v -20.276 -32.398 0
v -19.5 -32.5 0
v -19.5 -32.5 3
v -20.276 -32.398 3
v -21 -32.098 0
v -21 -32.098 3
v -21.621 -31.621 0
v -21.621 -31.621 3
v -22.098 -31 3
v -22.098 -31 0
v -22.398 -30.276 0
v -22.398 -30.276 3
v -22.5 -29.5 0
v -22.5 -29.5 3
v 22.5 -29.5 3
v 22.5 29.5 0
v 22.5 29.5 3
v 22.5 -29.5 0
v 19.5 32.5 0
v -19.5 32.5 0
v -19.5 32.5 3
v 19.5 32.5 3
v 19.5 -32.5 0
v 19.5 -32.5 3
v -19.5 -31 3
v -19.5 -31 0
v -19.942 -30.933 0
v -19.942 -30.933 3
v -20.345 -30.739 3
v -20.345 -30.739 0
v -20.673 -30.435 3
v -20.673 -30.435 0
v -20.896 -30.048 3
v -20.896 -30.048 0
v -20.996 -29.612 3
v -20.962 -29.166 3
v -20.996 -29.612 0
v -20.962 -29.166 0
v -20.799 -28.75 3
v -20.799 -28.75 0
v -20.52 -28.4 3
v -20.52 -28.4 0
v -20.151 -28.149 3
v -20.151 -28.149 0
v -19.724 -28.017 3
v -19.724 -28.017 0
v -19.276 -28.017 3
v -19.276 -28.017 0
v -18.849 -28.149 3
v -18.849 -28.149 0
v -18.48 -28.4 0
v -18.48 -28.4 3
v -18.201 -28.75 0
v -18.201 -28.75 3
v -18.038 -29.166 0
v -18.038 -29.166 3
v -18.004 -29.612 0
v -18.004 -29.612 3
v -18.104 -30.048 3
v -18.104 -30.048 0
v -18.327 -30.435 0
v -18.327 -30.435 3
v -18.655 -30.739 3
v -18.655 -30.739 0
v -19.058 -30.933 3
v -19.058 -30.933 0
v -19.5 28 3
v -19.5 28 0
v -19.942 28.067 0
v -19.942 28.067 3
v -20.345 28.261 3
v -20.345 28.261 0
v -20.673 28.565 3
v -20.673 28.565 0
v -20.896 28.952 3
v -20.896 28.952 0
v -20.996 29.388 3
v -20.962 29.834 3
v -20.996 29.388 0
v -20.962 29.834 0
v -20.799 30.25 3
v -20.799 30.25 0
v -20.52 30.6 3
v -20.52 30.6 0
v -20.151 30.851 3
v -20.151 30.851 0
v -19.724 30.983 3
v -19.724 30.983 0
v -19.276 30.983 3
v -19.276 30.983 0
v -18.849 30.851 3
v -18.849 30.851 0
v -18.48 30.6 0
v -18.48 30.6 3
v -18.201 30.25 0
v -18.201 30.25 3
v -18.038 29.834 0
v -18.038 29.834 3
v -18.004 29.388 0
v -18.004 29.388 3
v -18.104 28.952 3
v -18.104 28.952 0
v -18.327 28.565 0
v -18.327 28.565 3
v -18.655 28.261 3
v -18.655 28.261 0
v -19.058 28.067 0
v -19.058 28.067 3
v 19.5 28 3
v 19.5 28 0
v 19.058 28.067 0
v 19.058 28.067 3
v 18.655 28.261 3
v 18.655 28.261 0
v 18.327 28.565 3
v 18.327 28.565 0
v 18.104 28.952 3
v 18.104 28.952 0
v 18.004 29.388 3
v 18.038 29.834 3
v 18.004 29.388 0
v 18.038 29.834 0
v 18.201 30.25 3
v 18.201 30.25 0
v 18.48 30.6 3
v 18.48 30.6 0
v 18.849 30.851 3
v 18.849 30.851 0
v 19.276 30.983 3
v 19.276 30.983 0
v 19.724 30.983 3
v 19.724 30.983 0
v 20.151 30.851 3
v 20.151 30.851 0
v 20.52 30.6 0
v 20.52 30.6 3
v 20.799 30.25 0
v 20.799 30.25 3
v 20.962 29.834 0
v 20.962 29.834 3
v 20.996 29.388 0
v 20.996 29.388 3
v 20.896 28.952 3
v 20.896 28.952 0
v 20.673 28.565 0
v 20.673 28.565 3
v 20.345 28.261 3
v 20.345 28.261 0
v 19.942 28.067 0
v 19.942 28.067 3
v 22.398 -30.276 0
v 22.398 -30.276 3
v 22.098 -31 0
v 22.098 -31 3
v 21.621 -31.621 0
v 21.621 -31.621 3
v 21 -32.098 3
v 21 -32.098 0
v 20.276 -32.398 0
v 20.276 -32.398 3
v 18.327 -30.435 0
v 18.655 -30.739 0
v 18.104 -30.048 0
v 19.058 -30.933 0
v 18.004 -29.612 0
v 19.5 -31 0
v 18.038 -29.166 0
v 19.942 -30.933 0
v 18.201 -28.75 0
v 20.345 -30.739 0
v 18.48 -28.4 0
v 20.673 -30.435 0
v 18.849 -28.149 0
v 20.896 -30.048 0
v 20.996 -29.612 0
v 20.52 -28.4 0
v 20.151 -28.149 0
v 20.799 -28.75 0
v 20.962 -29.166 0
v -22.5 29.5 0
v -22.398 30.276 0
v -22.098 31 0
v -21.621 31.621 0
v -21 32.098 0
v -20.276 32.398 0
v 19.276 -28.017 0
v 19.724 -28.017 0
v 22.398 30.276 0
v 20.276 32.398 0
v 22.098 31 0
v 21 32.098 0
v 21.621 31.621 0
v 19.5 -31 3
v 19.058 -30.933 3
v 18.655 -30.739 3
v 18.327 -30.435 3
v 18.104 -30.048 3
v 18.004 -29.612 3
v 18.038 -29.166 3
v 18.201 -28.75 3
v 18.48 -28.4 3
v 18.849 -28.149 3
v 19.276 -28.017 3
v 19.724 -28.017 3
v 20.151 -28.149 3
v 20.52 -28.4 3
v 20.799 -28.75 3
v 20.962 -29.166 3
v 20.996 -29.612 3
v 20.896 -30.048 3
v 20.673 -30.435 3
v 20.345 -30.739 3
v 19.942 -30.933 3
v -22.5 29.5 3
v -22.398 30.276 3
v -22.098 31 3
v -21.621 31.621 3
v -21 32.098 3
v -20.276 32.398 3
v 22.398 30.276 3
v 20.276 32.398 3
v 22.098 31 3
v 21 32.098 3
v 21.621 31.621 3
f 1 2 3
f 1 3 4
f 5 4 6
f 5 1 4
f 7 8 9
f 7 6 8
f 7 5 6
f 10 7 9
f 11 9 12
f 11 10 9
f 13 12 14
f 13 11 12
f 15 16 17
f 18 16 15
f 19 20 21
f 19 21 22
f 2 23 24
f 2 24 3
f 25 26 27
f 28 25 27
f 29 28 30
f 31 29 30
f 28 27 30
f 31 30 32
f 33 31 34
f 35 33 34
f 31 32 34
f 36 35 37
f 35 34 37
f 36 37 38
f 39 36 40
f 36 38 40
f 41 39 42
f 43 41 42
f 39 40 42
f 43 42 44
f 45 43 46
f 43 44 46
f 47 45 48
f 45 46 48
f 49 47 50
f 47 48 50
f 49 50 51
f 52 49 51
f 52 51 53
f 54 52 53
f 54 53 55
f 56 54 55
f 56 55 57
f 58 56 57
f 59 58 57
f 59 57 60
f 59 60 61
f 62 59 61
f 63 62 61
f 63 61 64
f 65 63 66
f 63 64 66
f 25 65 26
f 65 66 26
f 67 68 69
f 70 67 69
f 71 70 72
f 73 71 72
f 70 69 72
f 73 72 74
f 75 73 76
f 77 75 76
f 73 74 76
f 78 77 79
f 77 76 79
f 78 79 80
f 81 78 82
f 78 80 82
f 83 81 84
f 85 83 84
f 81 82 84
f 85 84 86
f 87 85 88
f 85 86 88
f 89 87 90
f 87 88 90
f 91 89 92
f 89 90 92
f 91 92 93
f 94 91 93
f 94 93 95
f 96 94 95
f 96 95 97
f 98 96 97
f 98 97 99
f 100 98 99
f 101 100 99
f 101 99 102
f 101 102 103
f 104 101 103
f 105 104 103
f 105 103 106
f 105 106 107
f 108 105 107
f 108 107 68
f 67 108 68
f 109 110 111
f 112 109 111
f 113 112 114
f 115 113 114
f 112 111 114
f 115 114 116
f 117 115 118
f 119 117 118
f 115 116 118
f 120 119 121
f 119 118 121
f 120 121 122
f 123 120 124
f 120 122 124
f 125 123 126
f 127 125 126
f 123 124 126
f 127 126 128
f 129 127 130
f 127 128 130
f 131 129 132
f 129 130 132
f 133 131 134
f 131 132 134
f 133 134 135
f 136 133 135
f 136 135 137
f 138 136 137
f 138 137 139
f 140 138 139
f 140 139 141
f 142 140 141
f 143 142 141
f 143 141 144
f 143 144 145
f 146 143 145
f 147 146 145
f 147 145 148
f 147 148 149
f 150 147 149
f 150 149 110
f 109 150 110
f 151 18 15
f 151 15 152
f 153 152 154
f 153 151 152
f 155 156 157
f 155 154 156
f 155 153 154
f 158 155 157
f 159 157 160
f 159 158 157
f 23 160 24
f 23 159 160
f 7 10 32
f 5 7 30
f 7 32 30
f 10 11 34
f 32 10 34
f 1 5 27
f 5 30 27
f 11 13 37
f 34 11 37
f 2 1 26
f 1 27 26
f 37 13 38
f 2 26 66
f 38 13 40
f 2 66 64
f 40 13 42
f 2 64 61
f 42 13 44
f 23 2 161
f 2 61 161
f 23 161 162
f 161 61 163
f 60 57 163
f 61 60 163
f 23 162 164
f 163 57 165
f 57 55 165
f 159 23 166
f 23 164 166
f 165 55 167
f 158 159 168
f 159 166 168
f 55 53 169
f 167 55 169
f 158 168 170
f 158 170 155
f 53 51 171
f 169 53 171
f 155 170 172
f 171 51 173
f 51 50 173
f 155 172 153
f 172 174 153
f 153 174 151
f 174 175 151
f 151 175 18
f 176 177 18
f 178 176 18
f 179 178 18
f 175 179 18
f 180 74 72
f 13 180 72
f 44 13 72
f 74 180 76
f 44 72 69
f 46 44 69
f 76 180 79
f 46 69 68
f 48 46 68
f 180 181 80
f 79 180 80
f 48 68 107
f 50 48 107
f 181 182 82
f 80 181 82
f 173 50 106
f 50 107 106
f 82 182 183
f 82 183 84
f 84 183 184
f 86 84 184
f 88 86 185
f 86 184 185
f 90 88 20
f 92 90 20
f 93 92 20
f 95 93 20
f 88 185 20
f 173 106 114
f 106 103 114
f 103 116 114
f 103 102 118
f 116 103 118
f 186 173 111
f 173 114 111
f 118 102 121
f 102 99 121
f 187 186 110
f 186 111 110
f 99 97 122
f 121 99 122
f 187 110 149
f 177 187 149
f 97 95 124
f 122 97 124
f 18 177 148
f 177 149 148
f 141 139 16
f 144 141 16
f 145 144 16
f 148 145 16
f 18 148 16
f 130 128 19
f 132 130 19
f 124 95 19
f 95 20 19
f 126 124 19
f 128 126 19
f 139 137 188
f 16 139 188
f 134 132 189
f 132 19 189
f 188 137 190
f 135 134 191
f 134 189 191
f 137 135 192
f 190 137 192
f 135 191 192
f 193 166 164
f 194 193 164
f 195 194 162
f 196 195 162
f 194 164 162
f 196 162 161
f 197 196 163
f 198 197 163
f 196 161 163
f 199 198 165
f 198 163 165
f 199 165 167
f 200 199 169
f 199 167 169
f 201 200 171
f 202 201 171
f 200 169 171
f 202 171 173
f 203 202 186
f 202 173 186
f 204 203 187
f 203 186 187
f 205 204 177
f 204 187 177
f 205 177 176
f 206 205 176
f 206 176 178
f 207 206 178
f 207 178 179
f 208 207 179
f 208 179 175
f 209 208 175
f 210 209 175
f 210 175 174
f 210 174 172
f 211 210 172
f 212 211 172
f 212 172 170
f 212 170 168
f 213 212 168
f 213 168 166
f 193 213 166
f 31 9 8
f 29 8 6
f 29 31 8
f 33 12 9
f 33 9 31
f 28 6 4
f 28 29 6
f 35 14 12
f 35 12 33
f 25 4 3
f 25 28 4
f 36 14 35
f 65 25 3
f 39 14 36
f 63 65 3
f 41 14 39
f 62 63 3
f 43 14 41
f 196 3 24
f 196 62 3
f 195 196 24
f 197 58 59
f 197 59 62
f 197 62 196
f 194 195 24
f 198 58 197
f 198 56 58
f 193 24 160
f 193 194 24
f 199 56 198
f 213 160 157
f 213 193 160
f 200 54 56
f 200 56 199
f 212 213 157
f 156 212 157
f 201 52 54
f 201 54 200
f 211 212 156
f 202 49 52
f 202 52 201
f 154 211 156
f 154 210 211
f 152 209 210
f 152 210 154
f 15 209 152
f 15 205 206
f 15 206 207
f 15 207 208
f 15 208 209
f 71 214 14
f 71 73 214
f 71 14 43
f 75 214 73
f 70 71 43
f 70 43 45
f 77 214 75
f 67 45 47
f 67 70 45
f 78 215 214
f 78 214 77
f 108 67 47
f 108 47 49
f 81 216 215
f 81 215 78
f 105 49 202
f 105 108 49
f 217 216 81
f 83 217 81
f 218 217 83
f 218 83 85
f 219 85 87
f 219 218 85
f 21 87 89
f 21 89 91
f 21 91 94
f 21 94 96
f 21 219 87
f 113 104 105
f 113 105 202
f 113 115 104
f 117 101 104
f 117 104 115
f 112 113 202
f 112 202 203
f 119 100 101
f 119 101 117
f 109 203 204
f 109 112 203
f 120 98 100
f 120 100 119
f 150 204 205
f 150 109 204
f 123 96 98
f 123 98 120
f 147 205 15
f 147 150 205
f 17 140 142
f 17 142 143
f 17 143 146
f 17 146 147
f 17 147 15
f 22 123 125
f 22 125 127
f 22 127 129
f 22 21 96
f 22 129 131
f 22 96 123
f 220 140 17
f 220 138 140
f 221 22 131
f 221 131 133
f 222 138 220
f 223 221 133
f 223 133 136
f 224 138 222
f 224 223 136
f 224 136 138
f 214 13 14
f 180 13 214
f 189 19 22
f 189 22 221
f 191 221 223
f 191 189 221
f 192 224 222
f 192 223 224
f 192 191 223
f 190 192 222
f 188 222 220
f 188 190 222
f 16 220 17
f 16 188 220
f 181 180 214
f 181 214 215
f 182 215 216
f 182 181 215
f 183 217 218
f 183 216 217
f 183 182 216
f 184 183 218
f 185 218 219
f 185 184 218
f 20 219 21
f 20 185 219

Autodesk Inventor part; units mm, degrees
ref_plane "YZ Plane" through (0, 0, 0) normal (1, 0, 0) x (0, 1, 0)
ref_plane "XZ Plane" through (0, 0, 0) normal (0, 1, 0) x (-1, 0, 0)
ref_plane "XY Plane" through (0, 0, 0) normal (0, 0, 1) x (1, 0, 0)
sketch "スケッチ1" plane through (0, 0, 0) normal (0, 0, 1) x (1, 0, 0)
  line L0 (19.5, -32.5) -> (-19.5, -32.5)
  line L1 (-22.5, -29.5) -> (-22.5, 29.5)
  line L2 (-19.5, 32.5) -> (19.5, 32.5)
  line L3 (22.5, 29.5) -> (22.5, -29.5)
  line L4 (22.5, -32.5) -> (-22.5, 32.5) construction
  line L5 (-22.5, -32.5) -> (22.5, 32.5) construction
  arc A0 (-19.5, 32.5) -> (-22.5, 29.5) centre (-19.5, 29.5) ccw
  arc A1 (22.5, 29.5) -> (19.5, 32.5) centre (19.5, 29.5) ccw
  arc A2 (19.5, -32.5) -> (22.5, -29.5) centre (19.5, -29.5) ccw
  arc A3 (-22.5, -29.5) -> (-19.5, -32.5) centre (-19.5, -29.5) ccw
  point P0 (0, 0)
  dimension "d0" = 45
  dimension "d1" = 65
  dimension "d2" = 3
extrude "押し出し1" add sketch "スケッチ1" along normal blind 3
sketch "スケッチ2" plane through (0, 0, 3) normal (0, 0, 1) x (1, 0, 0)
  arc A0 (-19.5, 32.5) -> (-22.5, 29.5) centre (-19.5, 29.5) ccw projected
  arc A1 (-22.5, -29.5) -> (-19.5, -32.5) centre (-19.5, -29.5) ccw projected
  arc A2 (19.5, -32.5) -> (22.5, -29.5) centre (19.5, -29.5) ccw projected
  arc A3 (22.5, 29.5) -> (19.5, 32.5) centre (19.5, 29.5) ccw projected
  circle A4 centre (-19.5, 29.5) radius 1.5
  circle A5 centre (19.5, 29.5) radius 1.5
  circle A6 centre (19.5, -29.5) radius 1.5
  circle A7 centre (-19.5, -29.5) radius 1.5
  point P0 (0, 0)
  dimension "d5" = 3
hole "穴1" at (-19.5, -29.5, 3) at (19.5, -29.5, 3) at (19.5, 29.5, 3) at (-19.5, 29.5, 3) direction (0, 0, -1) diameter 3 end through all
properties part number "ET-40_Cover" material "ポリカーボネート、クリア"
